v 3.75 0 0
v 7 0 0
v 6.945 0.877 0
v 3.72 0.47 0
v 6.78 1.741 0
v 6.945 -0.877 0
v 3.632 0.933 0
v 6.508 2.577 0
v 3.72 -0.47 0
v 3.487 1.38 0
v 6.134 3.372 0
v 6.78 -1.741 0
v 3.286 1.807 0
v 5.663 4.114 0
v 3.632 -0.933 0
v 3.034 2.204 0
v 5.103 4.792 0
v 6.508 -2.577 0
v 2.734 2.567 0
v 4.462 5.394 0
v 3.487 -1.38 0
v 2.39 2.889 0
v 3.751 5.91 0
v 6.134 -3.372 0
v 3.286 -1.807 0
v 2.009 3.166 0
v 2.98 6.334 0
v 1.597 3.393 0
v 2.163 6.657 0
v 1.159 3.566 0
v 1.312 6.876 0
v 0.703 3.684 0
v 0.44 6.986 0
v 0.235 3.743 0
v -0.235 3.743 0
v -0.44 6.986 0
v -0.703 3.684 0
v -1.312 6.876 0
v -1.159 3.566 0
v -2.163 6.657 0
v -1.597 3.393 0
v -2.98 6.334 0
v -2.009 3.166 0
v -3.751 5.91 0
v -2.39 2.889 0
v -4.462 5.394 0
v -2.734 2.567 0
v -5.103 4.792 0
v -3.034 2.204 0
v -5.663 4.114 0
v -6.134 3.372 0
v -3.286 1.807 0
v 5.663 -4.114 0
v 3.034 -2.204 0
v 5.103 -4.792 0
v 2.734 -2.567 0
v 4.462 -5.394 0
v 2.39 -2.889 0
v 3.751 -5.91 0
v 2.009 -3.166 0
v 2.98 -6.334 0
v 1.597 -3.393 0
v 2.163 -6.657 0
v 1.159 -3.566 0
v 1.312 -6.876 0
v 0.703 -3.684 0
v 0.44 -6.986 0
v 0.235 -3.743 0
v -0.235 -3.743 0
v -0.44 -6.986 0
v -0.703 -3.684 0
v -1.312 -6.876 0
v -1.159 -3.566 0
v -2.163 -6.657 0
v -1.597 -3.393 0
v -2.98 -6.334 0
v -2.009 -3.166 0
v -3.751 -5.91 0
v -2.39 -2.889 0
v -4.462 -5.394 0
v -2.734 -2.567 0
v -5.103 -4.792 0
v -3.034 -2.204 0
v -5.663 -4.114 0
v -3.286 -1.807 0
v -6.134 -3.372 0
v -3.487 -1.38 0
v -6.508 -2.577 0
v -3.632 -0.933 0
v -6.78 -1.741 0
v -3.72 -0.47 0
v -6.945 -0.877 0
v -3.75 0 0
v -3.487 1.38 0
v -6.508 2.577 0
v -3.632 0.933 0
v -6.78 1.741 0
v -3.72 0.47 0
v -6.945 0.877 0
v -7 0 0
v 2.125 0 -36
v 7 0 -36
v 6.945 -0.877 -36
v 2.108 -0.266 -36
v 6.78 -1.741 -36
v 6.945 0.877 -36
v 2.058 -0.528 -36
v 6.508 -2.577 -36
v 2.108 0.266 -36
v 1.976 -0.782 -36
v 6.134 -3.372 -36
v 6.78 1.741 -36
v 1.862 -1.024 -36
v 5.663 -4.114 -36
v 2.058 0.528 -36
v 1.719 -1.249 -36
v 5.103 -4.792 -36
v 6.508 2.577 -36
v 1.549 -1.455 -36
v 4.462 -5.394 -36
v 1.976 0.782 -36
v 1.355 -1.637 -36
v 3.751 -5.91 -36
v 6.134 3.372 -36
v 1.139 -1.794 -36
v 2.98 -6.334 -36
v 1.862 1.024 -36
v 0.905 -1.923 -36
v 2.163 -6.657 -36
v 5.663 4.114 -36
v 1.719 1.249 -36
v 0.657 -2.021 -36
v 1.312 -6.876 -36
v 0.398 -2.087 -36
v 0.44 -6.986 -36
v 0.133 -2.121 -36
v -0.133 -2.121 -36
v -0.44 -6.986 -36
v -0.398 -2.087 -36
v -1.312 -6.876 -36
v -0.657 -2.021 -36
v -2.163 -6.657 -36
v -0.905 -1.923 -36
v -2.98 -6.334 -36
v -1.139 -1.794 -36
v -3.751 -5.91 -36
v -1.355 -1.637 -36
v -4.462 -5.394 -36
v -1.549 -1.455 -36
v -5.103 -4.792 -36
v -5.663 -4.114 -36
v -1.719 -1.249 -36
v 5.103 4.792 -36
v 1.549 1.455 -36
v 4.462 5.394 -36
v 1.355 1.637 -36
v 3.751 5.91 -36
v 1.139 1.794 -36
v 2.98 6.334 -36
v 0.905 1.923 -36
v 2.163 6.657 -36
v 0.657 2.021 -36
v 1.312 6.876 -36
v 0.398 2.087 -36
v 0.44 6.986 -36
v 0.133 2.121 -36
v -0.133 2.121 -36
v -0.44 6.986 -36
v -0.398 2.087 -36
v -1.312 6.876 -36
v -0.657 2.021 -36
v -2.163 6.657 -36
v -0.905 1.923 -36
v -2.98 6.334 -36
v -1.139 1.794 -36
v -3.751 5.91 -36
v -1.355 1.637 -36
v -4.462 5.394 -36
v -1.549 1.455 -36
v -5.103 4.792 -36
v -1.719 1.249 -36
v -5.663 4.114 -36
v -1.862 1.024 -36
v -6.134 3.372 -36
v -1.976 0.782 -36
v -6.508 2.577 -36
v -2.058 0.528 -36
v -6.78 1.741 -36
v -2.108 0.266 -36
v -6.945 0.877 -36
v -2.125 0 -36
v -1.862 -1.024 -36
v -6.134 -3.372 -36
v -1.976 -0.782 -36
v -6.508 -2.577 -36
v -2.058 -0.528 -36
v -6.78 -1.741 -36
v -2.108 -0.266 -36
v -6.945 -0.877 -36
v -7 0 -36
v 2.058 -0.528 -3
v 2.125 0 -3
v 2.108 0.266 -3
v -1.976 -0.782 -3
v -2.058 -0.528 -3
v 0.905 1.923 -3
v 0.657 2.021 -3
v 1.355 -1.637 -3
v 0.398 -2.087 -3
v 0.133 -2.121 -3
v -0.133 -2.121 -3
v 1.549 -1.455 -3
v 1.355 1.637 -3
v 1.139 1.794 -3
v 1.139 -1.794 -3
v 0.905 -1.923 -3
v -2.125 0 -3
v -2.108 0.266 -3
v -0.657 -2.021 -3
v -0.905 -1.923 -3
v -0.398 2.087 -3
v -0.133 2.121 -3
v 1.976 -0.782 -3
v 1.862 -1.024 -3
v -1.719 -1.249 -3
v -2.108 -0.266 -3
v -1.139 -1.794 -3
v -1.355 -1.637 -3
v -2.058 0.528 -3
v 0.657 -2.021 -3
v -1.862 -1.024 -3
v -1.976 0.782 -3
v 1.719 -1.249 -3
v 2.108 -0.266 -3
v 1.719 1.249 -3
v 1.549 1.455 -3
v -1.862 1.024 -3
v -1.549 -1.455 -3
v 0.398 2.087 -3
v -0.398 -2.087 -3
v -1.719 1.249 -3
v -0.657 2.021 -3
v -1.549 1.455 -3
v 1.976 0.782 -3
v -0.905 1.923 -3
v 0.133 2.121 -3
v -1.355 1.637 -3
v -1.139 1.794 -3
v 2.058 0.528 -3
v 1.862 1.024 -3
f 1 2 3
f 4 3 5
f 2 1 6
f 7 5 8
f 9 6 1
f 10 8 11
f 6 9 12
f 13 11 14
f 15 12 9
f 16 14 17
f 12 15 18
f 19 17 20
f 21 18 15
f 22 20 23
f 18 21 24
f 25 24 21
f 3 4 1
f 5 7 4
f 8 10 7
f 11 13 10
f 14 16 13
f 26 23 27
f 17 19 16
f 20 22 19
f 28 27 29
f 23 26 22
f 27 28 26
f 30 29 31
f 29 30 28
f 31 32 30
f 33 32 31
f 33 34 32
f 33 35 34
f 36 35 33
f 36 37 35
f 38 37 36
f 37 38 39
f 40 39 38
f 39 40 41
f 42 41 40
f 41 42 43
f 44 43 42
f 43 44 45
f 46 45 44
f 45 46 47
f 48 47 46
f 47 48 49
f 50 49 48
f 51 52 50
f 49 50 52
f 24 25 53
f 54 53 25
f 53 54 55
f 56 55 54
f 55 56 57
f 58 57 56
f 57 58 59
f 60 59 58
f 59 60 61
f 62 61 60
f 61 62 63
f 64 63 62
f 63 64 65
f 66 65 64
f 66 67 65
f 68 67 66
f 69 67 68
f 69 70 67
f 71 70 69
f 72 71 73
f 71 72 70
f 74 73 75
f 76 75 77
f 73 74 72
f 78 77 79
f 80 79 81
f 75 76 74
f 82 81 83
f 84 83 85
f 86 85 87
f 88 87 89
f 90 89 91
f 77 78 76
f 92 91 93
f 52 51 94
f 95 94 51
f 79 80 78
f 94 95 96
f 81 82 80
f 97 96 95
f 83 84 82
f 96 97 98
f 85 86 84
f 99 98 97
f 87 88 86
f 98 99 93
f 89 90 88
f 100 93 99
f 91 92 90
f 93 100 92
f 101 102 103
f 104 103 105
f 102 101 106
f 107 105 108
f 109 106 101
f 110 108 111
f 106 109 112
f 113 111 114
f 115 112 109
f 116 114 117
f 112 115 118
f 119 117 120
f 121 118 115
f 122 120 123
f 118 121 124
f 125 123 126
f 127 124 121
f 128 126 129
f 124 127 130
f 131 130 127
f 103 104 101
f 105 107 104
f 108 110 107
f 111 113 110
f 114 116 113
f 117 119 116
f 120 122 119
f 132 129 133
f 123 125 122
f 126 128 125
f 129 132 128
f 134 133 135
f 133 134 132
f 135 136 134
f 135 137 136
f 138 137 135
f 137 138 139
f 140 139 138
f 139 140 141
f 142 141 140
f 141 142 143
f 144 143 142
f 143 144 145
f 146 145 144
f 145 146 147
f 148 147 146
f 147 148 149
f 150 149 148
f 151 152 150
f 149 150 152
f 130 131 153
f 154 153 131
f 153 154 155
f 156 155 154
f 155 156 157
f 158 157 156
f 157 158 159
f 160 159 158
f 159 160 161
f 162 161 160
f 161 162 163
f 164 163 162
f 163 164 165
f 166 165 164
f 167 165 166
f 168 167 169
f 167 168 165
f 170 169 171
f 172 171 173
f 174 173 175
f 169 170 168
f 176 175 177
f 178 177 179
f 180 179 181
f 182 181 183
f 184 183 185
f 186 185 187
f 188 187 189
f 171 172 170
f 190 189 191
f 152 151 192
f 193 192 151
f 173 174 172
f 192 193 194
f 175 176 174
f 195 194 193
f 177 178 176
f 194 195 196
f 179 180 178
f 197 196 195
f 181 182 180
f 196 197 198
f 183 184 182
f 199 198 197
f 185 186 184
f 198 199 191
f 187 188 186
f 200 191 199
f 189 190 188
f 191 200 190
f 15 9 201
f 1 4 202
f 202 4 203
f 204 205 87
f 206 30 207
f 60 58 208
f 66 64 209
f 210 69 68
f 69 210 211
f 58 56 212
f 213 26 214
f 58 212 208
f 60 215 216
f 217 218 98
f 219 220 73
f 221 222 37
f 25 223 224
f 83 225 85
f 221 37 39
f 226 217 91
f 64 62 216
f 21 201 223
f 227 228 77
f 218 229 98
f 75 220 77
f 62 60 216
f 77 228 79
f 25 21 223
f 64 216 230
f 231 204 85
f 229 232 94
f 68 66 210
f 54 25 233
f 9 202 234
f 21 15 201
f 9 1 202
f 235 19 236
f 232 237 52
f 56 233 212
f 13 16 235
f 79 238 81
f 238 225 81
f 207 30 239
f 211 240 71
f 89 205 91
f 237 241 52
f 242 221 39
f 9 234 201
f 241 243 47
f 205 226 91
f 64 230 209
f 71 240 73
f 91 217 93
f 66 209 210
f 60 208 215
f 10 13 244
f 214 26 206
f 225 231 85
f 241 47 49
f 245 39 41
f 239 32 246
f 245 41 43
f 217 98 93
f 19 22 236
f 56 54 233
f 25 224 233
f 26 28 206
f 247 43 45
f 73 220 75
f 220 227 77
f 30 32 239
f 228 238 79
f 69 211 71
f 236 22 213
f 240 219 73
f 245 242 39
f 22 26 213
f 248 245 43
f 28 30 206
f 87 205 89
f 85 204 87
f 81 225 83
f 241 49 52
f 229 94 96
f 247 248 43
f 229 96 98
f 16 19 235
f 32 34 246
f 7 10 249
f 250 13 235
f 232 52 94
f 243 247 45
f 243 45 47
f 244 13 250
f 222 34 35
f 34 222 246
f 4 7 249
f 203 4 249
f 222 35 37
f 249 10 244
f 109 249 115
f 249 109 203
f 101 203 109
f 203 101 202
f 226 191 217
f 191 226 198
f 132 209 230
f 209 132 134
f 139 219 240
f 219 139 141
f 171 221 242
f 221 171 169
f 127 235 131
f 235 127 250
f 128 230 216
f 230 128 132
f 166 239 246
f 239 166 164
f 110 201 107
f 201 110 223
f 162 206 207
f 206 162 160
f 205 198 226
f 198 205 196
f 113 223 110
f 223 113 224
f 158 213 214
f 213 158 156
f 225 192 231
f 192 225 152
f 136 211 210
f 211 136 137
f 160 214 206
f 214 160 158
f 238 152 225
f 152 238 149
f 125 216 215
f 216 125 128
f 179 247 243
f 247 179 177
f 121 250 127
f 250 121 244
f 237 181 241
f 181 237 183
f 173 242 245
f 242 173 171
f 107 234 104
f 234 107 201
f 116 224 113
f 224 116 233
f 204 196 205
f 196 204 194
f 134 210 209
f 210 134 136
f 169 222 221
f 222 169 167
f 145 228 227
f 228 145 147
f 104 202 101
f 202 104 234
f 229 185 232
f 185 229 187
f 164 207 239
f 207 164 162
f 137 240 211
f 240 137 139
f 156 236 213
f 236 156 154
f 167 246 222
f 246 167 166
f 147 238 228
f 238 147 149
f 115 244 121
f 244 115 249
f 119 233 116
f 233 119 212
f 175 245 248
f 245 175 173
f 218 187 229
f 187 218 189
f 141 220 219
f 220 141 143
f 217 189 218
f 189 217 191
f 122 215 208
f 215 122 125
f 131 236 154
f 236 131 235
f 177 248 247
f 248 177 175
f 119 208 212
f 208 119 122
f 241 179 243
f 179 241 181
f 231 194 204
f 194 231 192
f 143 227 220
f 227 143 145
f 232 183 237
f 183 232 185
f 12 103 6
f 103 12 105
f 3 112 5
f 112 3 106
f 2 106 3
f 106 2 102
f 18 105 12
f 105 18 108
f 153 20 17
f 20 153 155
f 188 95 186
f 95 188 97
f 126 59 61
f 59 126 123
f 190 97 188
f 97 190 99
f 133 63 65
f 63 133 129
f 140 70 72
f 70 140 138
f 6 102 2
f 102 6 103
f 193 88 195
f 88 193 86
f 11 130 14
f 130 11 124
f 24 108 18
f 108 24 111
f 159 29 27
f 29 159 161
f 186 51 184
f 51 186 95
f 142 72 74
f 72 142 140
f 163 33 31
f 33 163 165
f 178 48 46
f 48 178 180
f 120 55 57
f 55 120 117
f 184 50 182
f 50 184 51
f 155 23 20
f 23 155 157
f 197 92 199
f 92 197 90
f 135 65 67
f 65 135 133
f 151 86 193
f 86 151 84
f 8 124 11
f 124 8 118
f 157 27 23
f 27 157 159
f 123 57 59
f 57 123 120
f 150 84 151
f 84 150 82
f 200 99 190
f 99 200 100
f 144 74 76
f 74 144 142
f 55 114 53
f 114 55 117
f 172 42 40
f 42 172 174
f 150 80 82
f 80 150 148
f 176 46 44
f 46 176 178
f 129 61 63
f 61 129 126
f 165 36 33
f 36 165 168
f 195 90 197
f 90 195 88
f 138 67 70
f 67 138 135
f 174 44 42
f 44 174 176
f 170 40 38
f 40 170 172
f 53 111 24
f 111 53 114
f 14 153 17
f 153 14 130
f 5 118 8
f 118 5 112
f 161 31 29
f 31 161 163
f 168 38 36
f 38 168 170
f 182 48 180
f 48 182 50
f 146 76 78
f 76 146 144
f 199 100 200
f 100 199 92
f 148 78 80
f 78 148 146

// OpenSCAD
$fn = 50;


difference() {
	union() {
		translate(v = [0, 0, -36.0000000000]) {
			cylinder(h = 36, r = 7.0000000000);
		}
		cylinder(h = 0, r = 13.0000000000);
	}
	union() {
		translate(v = [0, 0, 0]) {
			rotate(a = [0, 0, 0]) {
				difference() {
					union() {
						#translate(v = [0, 0, -36.0000000000]) {
							cylinder(h = 36, r = 2.0000000000);
						}
						#translate(v = [0, 0, -3]) {
							cylinder(h = 3, r1 = 2.1250000000, r2 = 3.7500000000);
						}
						#translate(v = [0, 0, -36.0000000000]) {
							cylinder(h = 36, r = 2.1250000000);
						}
						#translate(v = [0, 0, -36.0000000000]) {
							cylinder(h = 36, r = 2.0000000000);
						}
					}
					union();
				}
			}
		}
	}
}
